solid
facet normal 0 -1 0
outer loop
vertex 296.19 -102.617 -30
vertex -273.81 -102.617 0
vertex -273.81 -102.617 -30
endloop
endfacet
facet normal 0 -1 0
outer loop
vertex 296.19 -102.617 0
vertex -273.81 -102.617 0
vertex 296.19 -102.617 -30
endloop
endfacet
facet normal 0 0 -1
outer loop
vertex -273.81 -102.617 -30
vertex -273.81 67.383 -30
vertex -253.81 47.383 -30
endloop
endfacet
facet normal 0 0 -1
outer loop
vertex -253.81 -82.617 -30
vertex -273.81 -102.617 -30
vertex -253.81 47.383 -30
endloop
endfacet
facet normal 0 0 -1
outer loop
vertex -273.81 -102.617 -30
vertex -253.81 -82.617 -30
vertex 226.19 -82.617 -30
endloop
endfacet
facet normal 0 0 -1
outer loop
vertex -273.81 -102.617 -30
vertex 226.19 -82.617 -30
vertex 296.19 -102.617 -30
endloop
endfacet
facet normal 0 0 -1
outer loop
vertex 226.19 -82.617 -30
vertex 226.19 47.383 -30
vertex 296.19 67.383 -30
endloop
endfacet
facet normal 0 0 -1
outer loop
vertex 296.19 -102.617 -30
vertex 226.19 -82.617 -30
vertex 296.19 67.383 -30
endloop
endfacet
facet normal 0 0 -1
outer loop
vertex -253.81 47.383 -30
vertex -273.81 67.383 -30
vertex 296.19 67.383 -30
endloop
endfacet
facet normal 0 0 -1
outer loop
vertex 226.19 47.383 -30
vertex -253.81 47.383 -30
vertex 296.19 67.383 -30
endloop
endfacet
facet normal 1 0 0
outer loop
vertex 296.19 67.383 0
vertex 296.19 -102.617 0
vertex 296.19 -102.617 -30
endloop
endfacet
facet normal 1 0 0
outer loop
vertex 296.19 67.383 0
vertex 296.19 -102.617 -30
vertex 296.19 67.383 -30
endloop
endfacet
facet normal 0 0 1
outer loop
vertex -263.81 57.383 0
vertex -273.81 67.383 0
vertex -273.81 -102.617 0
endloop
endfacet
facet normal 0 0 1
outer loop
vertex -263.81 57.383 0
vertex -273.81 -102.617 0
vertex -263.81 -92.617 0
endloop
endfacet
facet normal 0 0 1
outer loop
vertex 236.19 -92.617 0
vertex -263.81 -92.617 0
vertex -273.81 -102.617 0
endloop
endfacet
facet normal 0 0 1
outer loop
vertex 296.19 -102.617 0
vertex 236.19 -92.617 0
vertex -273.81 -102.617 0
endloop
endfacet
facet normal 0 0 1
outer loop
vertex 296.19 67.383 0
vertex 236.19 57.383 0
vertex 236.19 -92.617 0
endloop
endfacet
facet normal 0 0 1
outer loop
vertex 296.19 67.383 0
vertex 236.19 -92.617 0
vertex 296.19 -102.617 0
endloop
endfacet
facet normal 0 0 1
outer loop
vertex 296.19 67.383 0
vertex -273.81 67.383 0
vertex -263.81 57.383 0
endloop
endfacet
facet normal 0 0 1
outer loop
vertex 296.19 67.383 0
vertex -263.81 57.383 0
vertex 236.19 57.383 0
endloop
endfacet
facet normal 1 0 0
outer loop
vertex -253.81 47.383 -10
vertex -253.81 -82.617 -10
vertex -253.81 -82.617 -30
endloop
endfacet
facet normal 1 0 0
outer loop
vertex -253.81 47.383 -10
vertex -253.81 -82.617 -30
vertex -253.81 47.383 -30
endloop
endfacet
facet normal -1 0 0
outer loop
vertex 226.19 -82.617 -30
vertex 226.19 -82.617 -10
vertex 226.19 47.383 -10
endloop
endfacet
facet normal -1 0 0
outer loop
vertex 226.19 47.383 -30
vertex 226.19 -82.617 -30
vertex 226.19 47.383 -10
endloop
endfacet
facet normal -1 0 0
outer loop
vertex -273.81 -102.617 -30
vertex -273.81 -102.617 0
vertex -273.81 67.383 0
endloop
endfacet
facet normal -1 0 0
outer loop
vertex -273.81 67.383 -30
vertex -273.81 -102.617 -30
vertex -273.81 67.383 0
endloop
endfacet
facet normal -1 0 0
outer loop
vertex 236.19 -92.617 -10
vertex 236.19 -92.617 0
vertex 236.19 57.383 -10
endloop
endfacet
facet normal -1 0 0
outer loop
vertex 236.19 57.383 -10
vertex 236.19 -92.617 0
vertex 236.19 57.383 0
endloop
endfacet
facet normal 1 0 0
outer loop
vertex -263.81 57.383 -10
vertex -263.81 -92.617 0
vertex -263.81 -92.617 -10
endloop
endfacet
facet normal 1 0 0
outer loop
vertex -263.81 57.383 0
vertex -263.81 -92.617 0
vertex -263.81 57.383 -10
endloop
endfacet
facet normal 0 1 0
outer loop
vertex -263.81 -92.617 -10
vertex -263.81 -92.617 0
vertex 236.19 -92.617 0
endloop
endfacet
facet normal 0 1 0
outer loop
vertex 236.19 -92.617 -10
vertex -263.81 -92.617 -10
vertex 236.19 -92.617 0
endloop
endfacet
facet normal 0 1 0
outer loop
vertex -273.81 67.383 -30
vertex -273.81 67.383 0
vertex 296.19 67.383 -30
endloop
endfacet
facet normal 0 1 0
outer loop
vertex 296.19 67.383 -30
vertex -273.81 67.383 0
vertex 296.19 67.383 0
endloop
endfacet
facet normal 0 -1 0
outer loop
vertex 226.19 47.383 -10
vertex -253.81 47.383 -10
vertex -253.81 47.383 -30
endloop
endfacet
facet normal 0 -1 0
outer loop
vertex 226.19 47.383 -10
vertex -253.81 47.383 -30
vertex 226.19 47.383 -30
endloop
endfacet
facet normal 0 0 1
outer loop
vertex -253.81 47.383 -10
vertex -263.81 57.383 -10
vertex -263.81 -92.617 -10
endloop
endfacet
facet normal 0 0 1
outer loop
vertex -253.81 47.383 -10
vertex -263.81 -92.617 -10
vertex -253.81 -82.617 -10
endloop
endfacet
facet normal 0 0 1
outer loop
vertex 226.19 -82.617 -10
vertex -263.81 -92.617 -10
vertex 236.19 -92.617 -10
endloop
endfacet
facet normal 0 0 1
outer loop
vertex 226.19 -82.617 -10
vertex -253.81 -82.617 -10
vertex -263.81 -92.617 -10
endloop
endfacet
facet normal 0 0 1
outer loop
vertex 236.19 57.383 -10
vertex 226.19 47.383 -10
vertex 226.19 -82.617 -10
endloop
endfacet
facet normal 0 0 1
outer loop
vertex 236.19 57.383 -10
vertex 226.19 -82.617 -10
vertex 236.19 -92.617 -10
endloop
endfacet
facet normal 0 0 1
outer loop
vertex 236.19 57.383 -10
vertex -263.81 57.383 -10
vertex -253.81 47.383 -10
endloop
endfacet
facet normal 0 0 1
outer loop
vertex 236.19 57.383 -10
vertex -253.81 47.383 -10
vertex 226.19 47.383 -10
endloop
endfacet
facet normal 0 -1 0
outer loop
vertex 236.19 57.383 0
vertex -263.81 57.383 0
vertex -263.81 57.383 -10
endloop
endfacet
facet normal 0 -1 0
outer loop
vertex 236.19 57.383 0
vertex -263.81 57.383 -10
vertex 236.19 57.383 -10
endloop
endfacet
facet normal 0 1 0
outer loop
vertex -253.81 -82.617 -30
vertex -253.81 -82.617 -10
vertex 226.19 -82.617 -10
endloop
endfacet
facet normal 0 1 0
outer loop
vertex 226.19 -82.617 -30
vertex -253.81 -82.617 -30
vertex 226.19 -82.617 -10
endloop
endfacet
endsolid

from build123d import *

# Parameters (mm, degrees)
F0_W     = 570
F0_H     = 170
F1_DEPTH = 30
F2_W     = 500
F2_H     = 150
F3_DEPTH = 10
F4_W     = 480
F4_H     = 130
F5_DEPTH = 20


with BuildPart() as f1:
    # F0 (on Top) → F1 (new body)
    with BuildSketch(Plane.XY):
        with Locations((11.190109, -17.617314)):
            Rectangle(F0_W, F0_H)
    extrude(amount=-F1_DEPTH)

    # F2 (on face) → F3 (cut)
    with BuildSketch(Plane.XY):
        with Locations((-13.809891, -17.617314)):
            Rectangle(F2_W, F2_H)
    extrude(amount=-F3_DEPTH, mode=Mode.SUBTRACT)

    # F4 (on face) → F5 (cut, through all)
    with BuildSketch(Plane.XY.offset(-10)):
        with Locations((-13.809891, -17.617314)):
            Rectangle(F4_W, F4_H)
    extrude(amount=-F5_DEPTH, mode=Mode.SUBTRACT)


solid = f1.part
